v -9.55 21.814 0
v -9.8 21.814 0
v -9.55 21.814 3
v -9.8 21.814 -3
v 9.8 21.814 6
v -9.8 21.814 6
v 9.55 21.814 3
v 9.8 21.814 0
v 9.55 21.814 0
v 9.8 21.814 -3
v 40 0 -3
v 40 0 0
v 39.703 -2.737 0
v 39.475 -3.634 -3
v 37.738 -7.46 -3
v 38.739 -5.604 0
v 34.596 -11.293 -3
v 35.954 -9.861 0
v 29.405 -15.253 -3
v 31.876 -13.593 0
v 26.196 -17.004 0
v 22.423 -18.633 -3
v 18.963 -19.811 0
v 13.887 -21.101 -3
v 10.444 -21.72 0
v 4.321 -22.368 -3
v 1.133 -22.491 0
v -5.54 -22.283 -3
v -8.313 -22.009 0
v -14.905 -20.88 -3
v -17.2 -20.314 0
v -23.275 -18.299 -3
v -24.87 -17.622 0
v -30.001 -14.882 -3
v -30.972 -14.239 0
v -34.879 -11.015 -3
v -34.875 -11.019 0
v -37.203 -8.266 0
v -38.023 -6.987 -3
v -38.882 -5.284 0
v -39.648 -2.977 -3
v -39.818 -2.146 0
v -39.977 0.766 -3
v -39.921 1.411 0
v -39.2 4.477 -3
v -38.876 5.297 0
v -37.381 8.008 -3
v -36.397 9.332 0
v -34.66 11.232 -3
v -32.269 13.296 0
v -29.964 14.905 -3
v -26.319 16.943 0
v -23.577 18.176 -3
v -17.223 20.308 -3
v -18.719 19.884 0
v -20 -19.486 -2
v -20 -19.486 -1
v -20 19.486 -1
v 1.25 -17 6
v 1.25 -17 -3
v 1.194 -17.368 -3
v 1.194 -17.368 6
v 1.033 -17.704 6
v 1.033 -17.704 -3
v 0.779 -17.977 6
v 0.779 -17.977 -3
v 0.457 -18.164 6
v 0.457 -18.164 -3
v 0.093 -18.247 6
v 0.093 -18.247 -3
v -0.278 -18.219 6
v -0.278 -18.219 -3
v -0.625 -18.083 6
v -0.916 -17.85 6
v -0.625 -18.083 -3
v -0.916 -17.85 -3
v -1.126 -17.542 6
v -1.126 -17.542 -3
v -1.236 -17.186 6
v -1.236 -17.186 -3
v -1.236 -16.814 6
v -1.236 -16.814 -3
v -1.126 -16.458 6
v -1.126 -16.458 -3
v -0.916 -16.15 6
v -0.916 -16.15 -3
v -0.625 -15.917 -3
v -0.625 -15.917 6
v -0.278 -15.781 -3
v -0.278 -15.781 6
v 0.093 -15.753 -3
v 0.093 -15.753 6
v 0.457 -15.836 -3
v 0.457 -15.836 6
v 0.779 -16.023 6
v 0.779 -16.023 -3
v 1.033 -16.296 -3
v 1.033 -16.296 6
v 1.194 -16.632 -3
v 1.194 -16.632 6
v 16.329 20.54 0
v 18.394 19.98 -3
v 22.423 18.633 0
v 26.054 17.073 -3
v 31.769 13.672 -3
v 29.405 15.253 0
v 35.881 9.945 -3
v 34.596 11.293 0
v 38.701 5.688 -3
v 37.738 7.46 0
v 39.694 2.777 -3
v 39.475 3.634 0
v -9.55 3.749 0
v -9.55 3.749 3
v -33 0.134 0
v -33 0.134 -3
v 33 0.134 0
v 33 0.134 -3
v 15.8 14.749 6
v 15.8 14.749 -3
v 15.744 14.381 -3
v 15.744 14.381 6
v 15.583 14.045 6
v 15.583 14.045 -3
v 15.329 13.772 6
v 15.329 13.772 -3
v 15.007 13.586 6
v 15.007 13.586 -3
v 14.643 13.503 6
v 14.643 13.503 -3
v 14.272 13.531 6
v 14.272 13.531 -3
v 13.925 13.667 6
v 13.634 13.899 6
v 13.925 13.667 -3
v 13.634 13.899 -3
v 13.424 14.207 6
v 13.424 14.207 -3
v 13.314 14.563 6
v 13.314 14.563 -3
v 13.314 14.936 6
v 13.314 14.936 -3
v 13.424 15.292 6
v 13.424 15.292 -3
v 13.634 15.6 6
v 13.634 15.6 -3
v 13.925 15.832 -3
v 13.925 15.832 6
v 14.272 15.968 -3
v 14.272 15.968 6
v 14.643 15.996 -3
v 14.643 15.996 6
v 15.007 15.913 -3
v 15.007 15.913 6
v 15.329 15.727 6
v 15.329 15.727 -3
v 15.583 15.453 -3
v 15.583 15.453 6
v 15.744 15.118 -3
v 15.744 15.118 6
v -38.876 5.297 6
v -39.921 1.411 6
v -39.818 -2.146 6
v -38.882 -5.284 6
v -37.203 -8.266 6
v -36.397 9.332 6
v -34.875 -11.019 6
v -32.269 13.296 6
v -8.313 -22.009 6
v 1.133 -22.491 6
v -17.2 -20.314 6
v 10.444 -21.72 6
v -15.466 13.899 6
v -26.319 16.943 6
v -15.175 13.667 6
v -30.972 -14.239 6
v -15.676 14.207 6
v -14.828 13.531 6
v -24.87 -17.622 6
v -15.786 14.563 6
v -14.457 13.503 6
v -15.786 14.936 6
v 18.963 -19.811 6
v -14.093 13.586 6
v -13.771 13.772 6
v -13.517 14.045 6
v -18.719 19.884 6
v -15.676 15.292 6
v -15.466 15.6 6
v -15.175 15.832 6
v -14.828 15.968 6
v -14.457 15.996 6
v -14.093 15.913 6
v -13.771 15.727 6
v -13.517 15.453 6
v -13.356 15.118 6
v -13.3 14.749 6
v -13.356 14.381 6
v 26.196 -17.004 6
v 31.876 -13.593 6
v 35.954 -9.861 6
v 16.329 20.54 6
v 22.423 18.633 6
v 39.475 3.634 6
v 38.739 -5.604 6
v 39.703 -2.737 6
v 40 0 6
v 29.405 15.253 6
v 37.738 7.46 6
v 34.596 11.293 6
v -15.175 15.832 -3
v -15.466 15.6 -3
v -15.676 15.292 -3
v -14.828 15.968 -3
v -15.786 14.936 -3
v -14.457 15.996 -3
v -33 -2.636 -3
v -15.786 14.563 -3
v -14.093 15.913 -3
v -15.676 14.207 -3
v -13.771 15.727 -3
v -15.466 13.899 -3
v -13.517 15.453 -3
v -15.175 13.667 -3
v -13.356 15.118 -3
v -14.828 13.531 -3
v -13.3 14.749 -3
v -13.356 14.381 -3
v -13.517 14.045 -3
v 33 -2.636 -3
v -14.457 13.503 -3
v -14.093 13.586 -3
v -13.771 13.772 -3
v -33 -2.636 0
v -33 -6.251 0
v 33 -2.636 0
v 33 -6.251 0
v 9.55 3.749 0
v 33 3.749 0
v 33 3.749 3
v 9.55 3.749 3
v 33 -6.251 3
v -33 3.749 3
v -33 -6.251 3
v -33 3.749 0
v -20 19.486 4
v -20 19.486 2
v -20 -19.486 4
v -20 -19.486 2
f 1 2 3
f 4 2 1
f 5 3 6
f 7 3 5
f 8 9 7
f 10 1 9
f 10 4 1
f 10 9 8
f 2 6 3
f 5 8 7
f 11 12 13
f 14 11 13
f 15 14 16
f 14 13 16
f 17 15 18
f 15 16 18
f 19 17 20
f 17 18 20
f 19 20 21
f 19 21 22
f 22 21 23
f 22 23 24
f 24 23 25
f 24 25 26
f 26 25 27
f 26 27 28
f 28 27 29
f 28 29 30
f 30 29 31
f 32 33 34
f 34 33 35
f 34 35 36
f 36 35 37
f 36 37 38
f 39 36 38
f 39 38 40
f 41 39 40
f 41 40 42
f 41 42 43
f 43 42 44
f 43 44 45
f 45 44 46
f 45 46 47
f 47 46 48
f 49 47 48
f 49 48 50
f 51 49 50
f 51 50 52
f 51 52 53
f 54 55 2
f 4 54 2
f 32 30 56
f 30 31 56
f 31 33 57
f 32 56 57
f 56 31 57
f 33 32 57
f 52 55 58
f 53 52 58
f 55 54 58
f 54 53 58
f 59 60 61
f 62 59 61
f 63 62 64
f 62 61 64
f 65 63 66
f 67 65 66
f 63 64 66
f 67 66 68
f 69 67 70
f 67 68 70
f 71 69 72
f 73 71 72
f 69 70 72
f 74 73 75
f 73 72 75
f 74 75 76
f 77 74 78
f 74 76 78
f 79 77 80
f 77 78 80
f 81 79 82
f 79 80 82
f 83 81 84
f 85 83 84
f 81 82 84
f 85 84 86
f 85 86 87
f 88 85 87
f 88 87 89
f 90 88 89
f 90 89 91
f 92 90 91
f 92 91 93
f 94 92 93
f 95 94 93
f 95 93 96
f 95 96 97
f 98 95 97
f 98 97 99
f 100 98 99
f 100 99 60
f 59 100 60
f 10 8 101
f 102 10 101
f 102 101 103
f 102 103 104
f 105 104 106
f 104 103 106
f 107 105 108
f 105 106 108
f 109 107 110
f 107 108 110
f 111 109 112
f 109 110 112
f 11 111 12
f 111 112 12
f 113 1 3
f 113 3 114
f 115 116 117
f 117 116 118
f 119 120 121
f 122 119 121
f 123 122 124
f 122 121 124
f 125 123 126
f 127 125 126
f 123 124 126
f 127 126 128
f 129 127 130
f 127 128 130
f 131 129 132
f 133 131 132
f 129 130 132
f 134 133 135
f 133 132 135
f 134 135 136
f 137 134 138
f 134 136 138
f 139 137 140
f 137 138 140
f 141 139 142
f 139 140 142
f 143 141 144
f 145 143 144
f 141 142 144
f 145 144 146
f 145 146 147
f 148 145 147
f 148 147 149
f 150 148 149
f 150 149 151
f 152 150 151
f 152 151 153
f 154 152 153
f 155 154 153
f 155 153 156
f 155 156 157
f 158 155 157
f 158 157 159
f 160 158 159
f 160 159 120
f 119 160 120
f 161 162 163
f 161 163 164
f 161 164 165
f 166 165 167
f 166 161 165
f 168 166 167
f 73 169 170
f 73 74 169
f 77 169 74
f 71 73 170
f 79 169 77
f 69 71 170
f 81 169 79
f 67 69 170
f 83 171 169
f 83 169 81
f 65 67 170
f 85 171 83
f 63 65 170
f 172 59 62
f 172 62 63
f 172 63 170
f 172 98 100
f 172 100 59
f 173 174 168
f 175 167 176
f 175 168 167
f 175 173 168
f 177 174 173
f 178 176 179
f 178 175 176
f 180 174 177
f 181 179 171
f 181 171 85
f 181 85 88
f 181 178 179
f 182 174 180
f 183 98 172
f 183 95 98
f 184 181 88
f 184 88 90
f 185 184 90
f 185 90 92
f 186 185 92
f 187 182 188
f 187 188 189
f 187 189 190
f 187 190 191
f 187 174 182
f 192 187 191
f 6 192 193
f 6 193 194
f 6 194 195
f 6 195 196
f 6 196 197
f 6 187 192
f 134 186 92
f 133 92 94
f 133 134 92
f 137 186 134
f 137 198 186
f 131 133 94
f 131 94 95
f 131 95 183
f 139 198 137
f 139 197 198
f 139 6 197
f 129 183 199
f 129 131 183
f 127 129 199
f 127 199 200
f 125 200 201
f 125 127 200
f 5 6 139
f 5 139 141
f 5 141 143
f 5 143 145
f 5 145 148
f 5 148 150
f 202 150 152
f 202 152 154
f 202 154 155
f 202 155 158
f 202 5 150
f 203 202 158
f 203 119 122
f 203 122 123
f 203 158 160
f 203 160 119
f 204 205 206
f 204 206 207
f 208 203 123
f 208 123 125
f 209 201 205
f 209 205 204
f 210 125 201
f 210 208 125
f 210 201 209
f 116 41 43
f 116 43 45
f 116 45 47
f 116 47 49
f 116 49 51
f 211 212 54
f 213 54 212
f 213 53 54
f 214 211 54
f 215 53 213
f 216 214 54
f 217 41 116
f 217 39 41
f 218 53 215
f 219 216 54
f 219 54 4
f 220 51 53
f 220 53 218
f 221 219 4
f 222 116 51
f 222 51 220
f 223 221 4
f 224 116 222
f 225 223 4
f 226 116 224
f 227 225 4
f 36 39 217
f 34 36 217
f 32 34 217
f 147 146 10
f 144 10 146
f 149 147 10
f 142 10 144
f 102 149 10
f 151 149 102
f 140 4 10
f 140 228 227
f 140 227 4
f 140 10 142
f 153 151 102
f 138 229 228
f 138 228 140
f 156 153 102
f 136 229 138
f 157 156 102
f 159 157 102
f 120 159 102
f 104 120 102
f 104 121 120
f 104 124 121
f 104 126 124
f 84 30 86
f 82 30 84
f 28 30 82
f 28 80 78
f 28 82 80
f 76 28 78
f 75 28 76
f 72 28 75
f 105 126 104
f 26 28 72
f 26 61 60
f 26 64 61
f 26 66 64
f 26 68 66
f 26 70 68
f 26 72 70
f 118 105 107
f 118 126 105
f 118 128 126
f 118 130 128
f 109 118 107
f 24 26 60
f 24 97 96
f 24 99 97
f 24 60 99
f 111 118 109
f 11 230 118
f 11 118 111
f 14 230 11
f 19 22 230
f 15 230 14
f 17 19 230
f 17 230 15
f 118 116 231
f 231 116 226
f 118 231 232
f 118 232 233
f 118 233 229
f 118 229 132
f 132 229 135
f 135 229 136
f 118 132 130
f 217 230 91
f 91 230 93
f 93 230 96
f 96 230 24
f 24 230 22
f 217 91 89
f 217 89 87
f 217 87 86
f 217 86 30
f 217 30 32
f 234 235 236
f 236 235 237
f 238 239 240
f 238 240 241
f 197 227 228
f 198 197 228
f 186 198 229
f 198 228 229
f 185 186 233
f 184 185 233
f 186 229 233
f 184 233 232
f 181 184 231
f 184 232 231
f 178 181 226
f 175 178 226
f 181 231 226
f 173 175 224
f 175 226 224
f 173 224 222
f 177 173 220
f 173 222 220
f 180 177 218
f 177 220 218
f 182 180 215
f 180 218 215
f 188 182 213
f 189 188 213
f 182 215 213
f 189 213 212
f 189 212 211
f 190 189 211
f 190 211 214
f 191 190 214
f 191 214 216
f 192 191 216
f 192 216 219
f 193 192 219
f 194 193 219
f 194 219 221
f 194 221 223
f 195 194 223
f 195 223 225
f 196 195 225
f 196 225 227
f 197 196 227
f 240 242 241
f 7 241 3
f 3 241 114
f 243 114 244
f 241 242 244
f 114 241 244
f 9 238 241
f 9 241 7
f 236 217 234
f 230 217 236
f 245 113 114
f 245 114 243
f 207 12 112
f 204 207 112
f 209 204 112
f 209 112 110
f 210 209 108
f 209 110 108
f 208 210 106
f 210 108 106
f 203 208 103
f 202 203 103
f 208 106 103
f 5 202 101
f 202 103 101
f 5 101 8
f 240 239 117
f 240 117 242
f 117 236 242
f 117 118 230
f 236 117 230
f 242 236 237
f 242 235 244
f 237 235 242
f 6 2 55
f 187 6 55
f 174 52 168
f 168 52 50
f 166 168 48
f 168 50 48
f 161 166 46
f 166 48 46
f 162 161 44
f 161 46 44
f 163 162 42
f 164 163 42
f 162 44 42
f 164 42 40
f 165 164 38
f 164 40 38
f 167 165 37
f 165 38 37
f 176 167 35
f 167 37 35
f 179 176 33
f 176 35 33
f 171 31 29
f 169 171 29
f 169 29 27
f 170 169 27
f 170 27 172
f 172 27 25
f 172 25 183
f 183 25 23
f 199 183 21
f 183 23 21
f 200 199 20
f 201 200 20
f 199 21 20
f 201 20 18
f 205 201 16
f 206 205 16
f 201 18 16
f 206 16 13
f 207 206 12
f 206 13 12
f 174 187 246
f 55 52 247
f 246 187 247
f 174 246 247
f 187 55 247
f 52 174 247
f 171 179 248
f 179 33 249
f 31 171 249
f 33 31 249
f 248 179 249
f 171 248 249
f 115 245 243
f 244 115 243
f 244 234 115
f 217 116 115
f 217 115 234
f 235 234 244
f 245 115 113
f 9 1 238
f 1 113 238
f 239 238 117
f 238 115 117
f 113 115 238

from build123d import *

# Parameters (mm, degrees)
PAD_DEPTH       = 6
POCKET_DEPTH    = 3
PAD001_DEPTH    = 3
SKETCH003_W     = 66
SKETCH003_H     = 2.77
POCKET001_DEPTH = 3
SKETCH004_W     = 19.6
SKETCH004_H     = 1
POCKET002_DEPTH = 9.001
SKETCH005_R     = 1.25
POCKET003_DEPTH = 9.001


with BuildPart() as part:
    # Sketch → Pad (new body)
    with BuildSketch(Plane.XY):
        with BuildLine():
            add(Edge.make_bspline(
                [(40, 0), (40, 38.971143), (-20, 19.485572), (-80, 0), (-20, -19.485572), (40, -38.971143), (40, 0)],
                knots=[0, 0, 0, 2.094395, 2.094395, 4.18879, 4.18879, 6.283185, 6.283185, 6.283185], degree=2, weights=[1, 0.5, 1, 0.5, 1, 0.5, 1]))
        make_face()
    extrude(amount=PAD_DEPTH)

    # Sketch001 (on Face2 of Pad) → Pocket (cut)
    with BuildSketch(Plane(origin=(0, 0, 0), x_dir=(1, 0, 0), z_dir=(0, 0, -1))):
        Polygon((9.55, -3.749324), (9.55, -21.849324), (-9.55, -21.849324), (-9.55, -3.749324), (-33, -3.749324), (-33, 6.250676), (33, 6.250676), (33, -3.749324), align=None)
    extrude(amount=-POCKET_DEPTH, mode=Mode.SUBTRACT)

    # Sketch002 (on Face2 of Pocket) → Pad001 (join)
    with BuildSketch(Plane(origin=(0, 0, 0), x_dir=(1, 0, 0), z_dir=(0, 0, -1))):
        with BuildLine():
            add(Edge.make_bspline(
                [(40, 0), (40, 38.971143), (-20, 19.485572), (-80, 0), (-20, -19.485572), (40, -38.971143), (40, 0)],
                knots=[0, 0, 0, 2.094395, 2.094395, 4.18879, 4.18879, 6.283185, 6.283185, 6.283185], degree=2, weights=[1, 0.5, 1, 0.5, 1, 0.5, 1]))
        make_face()
    extrude(amount=PAD001_DEPTH)

    # Sketch003 (on Face4 of Pad001) → Pocket001 (cut)
    with BuildSketch(Plane(origin=(0, 0, -3), x_dir=(1, 0, 0), z_dir=(0, 0, -1))):
        with Locations((0, 1.250676)):
            Rectangle(SKETCH003_W, SKETCH003_H)
    extrude(amount=-POCKET001_DEPTH, mode=Mode.SUBTRACT)

    # Sketch004 (on Face4 of Pocket001) → Pocket002 (cut, through all)
    with BuildSketch(Plane(origin=(0, 0, -3), x_dir=(1, 0, 0), z_dir=(0, 0, -1))):
        with Locations((0, -22.314269)):
            Rectangle(SKETCH004_W, SKETCH004_H)
    extrude(amount=-POCKET002_DEPTH, mode=Mode.SUBTRACT)

    # Sketch005 (on Face7 of Pocket002) → Pocket003 (cut, through all)
    with BuildSketch(Plane(origin=(0, 0, -3), x_dir=(1, 0, 0), z_dir=(0, 0, -1))):
        with Locations((-14.55, -14.749324)):
            Circle(SKETCH005_R)
        with Locations((0, 17)):
            Circle(SKETCH005_R)
        with Locations((14.55, -14.749324)):
            Circle(SKETCH005_R)
    extrude(amount=-POCKET003_DEPTH, mode=Mode.SUBTRACT)


solid = part.part
